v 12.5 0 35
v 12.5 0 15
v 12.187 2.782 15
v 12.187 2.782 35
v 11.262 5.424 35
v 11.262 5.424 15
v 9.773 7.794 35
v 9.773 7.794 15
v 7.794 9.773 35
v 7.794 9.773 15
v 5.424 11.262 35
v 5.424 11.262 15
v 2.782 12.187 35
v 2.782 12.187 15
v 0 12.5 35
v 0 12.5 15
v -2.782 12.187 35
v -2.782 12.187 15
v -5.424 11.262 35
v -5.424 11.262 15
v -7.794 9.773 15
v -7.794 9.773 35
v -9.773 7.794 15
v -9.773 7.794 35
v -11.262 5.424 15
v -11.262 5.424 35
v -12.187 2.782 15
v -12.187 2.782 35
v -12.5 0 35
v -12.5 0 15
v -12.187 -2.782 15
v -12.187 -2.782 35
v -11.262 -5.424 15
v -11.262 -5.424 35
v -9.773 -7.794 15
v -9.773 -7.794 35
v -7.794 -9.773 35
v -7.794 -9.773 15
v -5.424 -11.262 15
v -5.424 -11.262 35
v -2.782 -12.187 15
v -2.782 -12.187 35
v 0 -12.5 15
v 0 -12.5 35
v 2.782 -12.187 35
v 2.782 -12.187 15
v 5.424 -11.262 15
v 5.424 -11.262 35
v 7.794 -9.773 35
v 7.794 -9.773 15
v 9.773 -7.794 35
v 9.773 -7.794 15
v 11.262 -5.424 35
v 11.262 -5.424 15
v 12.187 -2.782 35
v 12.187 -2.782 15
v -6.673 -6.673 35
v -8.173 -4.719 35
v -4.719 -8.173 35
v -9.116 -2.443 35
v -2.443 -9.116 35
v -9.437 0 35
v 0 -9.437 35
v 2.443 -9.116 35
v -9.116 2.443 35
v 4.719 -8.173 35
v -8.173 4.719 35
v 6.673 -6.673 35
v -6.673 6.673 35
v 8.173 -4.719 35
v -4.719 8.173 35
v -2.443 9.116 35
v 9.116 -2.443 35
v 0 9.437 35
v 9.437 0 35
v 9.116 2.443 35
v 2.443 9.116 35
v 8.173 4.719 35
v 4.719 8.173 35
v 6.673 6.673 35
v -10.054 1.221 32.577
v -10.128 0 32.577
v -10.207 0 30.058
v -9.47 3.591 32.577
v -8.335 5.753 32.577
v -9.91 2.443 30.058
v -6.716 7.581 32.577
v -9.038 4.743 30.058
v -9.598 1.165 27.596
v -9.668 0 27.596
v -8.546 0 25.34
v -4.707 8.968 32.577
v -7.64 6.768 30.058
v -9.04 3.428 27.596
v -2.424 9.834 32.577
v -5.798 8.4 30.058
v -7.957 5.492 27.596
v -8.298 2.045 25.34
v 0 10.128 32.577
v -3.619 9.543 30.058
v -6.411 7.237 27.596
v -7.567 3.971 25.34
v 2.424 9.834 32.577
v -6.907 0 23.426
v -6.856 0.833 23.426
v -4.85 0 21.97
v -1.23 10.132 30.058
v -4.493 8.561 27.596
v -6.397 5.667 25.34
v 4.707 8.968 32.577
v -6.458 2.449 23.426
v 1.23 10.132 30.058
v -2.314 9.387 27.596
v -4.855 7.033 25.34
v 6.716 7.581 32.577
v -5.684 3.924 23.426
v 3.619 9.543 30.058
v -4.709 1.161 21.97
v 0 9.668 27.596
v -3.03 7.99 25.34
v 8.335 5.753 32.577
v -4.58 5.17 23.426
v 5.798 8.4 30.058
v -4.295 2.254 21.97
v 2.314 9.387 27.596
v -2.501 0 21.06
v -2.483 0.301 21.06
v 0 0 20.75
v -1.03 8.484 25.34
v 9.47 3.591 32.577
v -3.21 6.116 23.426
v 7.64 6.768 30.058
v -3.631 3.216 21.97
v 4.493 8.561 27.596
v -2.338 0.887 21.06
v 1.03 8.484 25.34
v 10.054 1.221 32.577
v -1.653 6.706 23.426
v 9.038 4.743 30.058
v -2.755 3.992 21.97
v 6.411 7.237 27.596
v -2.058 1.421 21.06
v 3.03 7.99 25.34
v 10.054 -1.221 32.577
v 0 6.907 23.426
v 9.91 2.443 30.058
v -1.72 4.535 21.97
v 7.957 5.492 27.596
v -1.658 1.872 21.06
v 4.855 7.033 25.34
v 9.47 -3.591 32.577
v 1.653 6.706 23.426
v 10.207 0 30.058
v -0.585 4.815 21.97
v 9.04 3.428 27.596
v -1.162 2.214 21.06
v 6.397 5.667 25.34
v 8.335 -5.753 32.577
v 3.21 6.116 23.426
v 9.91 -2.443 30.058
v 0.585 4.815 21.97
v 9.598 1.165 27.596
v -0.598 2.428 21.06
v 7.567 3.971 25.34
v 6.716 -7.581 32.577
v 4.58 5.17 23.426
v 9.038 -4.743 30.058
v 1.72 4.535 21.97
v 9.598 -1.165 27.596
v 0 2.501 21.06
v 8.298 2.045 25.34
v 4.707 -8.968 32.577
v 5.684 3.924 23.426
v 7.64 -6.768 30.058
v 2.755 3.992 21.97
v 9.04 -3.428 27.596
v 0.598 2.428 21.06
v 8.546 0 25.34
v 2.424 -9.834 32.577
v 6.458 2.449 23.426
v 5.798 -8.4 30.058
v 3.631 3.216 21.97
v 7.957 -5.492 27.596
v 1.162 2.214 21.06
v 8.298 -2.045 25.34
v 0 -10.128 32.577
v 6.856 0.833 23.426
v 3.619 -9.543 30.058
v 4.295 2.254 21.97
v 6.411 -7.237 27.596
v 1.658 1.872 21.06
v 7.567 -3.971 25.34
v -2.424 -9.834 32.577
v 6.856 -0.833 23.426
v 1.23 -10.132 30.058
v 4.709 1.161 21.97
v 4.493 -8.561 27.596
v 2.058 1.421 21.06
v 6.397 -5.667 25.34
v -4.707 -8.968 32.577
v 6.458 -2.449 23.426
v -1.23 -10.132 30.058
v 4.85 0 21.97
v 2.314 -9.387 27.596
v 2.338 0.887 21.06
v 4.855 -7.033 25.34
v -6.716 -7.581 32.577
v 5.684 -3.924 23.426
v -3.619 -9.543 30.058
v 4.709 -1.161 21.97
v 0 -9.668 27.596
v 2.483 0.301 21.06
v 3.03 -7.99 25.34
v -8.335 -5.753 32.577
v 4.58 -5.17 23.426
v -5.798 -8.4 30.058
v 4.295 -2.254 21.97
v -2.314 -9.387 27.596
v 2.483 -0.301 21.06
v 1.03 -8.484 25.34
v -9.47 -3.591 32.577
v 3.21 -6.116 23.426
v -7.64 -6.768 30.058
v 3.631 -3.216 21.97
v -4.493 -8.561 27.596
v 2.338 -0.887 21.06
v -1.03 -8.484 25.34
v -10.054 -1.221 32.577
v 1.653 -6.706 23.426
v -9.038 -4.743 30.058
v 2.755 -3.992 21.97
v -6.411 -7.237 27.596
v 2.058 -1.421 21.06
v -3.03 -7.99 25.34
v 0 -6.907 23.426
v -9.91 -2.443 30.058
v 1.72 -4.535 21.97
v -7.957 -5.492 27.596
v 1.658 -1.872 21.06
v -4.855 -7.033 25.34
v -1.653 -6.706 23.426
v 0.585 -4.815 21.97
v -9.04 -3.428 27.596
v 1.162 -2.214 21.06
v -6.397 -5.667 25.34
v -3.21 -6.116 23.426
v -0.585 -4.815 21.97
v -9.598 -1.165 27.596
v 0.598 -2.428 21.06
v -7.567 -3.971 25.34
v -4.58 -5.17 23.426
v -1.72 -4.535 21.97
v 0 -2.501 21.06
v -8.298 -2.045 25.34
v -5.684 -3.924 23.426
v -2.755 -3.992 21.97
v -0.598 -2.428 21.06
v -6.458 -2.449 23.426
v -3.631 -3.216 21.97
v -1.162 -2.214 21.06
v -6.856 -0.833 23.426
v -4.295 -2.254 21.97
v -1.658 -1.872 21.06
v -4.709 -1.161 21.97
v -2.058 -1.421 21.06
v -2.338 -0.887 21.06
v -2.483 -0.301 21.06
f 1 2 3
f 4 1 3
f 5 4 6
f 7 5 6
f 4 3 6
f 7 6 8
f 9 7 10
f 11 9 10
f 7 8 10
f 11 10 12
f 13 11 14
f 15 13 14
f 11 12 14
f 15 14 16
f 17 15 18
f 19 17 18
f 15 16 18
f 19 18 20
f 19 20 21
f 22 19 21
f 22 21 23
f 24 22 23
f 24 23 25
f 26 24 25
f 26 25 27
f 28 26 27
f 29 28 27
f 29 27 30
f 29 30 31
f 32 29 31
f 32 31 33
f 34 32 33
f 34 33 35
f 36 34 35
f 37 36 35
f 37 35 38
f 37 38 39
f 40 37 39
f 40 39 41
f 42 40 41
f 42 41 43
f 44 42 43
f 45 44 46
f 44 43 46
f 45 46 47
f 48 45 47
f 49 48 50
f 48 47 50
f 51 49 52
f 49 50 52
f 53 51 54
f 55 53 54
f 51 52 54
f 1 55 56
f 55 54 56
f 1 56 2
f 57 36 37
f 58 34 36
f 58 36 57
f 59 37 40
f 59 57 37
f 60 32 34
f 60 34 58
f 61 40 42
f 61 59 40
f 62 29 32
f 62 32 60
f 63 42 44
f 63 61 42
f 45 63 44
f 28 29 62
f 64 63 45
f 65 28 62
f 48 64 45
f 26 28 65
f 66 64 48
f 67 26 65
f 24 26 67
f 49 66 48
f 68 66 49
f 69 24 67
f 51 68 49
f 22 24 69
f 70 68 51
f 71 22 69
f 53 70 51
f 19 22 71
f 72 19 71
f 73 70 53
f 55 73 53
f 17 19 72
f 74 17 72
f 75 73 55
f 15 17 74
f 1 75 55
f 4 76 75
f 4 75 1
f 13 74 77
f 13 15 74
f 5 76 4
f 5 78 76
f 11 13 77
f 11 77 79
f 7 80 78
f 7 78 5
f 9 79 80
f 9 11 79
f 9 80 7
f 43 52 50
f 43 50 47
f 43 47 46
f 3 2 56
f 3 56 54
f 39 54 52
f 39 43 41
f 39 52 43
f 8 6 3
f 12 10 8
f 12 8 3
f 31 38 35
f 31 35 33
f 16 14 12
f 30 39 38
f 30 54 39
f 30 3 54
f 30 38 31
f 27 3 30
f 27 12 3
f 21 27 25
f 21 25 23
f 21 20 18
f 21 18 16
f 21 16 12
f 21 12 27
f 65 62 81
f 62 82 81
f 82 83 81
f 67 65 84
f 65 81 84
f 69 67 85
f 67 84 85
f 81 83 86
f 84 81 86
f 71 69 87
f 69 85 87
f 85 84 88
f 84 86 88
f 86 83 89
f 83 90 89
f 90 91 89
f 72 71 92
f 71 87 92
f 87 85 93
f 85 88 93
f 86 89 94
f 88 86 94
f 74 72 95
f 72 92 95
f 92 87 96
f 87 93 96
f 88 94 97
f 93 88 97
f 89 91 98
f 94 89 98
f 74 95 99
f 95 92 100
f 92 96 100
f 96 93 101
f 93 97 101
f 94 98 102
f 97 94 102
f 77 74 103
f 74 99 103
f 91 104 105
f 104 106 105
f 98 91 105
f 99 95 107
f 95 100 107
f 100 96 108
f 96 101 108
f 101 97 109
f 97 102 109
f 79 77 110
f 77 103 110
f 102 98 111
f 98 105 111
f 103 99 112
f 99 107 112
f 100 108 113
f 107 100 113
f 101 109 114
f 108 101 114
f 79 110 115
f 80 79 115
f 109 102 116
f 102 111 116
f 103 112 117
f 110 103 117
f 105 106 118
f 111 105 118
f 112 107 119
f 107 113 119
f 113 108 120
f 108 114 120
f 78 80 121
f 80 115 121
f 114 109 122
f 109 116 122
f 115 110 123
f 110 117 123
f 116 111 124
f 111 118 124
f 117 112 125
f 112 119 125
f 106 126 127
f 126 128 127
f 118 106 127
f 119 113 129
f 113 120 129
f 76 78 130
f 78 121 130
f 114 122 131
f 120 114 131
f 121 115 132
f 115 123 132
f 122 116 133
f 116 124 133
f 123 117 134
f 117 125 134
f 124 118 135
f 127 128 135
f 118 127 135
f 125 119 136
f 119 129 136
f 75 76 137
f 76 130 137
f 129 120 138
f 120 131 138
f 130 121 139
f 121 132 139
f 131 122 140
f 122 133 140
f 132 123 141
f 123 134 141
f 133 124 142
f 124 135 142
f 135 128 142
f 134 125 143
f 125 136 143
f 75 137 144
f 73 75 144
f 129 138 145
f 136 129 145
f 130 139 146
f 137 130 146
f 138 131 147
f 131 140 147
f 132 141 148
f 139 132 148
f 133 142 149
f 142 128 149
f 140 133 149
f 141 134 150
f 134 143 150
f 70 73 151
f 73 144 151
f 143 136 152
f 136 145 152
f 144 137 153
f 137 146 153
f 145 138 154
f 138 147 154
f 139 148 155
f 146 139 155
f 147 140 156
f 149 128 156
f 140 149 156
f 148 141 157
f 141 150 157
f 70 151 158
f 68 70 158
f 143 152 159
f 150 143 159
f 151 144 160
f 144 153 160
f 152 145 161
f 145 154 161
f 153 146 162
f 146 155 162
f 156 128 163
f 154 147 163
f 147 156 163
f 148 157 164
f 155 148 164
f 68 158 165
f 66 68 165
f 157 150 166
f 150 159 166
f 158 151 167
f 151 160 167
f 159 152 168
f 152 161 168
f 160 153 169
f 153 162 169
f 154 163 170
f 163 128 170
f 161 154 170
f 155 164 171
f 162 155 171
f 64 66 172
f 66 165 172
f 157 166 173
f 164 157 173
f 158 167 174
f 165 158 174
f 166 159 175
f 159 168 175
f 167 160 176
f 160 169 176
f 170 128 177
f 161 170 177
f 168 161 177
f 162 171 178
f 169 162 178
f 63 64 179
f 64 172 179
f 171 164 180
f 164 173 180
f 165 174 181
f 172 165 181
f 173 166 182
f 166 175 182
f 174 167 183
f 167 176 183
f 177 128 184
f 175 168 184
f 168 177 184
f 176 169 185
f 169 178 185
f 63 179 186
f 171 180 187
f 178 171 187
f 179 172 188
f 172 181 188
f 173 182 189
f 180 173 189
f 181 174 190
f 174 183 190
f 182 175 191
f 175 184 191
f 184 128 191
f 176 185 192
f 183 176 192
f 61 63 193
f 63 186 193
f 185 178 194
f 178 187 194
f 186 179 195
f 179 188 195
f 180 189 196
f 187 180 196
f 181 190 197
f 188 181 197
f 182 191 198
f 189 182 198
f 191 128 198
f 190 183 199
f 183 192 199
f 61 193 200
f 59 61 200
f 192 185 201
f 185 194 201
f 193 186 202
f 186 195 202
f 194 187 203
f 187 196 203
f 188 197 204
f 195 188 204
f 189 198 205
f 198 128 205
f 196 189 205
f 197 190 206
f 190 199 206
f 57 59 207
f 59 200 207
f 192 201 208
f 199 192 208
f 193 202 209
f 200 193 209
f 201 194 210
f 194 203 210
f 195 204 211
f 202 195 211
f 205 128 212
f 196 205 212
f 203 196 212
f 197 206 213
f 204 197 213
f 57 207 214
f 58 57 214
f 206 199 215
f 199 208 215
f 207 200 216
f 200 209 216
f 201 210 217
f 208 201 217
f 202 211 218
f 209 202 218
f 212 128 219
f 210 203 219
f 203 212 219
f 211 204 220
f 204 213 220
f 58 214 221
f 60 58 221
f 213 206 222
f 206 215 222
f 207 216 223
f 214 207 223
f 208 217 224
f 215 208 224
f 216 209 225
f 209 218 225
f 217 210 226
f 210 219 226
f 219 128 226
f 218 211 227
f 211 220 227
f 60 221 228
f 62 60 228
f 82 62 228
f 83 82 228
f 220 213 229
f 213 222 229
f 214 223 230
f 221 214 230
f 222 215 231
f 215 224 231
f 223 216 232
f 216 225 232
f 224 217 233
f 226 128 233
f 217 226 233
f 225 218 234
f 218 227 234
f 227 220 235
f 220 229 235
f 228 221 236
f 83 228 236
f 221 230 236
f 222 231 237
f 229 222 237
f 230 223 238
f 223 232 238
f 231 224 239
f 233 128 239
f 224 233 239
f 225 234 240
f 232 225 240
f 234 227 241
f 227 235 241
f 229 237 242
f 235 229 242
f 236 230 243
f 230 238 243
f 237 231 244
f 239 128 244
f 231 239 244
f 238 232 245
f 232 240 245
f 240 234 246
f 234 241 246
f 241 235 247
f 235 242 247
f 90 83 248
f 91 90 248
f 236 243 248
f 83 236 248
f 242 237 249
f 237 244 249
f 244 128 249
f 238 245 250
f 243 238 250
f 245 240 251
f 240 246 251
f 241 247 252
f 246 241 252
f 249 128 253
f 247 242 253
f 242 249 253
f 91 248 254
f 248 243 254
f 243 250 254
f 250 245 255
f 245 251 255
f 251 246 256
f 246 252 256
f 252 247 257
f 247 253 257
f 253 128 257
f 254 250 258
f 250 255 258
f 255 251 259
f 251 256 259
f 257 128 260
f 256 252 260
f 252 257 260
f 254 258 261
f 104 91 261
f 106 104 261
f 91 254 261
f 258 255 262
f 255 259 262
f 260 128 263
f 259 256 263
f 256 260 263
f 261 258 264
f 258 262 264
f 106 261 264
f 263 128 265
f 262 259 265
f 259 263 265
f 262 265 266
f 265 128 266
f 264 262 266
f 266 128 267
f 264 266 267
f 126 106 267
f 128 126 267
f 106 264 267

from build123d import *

# Parameters (mm, degrees)
SKETCH_1_R          = 12.5
EXTRUDE_2_DEPTH     = 35
SKETCH_4_R          = 14.624451674
CUT_EXTRUDE_1_DEPTH = 15


with BuildPart() as part:
    # 스케치1 → 보스-돌출2 (new body)
    with BuildSketch(Plane.XY):
        Circle(SKETCH_1_R)
    extrude(amount=EXTRUDE_2_DEPTH)

    # 스케치3 → 컷-회전1 (revolve, cut)
    with BuildSketch(Plane(origin=(0, 0, 0), x_dir=(1, 0, 0), z_dir=(0, 1, 0))):
        with BuildLine():
            Line((0, -21), (0, -41))
            ThreePointArc((0, -41), (-10, -31), (0, -21))
        make_face()
    revolve(axis=Axis((0, 0, 35), (0, 0, -1)), mode=Mode.SUBTRACT)

    # 스케치4 → 컷-돌출1 (cut)
    with BuildSketch(Plane(origin=(0, 0, 0), x_dir=(-1, 0, 0), z_dir=(0, 0, -1))):
        Circle(SKETCH_4_R)
    extrude(amount=-CUT_EXTRUDE_1_DEPTH, mode=Mode.SUBTRACT)

    # 스케치5 → 컷-회전2 (revolve, cut)
    with BuildSketch(Plane(origin=(0, 0, 0), x_dir=(1, 0, 0), z_dir=(0, 1, 0))):
        with BuildLine():
            Line((0, -20.75), (0, -41.25))
            ThreePointArc((0, -41.25), (-10.25, -31), (0, -20.75))
        make_face()
    revolve(axis=Axis((0, 0, 35), (0, 0, -1)), mode=Mode.SUBTRACT)


solid = part.part
